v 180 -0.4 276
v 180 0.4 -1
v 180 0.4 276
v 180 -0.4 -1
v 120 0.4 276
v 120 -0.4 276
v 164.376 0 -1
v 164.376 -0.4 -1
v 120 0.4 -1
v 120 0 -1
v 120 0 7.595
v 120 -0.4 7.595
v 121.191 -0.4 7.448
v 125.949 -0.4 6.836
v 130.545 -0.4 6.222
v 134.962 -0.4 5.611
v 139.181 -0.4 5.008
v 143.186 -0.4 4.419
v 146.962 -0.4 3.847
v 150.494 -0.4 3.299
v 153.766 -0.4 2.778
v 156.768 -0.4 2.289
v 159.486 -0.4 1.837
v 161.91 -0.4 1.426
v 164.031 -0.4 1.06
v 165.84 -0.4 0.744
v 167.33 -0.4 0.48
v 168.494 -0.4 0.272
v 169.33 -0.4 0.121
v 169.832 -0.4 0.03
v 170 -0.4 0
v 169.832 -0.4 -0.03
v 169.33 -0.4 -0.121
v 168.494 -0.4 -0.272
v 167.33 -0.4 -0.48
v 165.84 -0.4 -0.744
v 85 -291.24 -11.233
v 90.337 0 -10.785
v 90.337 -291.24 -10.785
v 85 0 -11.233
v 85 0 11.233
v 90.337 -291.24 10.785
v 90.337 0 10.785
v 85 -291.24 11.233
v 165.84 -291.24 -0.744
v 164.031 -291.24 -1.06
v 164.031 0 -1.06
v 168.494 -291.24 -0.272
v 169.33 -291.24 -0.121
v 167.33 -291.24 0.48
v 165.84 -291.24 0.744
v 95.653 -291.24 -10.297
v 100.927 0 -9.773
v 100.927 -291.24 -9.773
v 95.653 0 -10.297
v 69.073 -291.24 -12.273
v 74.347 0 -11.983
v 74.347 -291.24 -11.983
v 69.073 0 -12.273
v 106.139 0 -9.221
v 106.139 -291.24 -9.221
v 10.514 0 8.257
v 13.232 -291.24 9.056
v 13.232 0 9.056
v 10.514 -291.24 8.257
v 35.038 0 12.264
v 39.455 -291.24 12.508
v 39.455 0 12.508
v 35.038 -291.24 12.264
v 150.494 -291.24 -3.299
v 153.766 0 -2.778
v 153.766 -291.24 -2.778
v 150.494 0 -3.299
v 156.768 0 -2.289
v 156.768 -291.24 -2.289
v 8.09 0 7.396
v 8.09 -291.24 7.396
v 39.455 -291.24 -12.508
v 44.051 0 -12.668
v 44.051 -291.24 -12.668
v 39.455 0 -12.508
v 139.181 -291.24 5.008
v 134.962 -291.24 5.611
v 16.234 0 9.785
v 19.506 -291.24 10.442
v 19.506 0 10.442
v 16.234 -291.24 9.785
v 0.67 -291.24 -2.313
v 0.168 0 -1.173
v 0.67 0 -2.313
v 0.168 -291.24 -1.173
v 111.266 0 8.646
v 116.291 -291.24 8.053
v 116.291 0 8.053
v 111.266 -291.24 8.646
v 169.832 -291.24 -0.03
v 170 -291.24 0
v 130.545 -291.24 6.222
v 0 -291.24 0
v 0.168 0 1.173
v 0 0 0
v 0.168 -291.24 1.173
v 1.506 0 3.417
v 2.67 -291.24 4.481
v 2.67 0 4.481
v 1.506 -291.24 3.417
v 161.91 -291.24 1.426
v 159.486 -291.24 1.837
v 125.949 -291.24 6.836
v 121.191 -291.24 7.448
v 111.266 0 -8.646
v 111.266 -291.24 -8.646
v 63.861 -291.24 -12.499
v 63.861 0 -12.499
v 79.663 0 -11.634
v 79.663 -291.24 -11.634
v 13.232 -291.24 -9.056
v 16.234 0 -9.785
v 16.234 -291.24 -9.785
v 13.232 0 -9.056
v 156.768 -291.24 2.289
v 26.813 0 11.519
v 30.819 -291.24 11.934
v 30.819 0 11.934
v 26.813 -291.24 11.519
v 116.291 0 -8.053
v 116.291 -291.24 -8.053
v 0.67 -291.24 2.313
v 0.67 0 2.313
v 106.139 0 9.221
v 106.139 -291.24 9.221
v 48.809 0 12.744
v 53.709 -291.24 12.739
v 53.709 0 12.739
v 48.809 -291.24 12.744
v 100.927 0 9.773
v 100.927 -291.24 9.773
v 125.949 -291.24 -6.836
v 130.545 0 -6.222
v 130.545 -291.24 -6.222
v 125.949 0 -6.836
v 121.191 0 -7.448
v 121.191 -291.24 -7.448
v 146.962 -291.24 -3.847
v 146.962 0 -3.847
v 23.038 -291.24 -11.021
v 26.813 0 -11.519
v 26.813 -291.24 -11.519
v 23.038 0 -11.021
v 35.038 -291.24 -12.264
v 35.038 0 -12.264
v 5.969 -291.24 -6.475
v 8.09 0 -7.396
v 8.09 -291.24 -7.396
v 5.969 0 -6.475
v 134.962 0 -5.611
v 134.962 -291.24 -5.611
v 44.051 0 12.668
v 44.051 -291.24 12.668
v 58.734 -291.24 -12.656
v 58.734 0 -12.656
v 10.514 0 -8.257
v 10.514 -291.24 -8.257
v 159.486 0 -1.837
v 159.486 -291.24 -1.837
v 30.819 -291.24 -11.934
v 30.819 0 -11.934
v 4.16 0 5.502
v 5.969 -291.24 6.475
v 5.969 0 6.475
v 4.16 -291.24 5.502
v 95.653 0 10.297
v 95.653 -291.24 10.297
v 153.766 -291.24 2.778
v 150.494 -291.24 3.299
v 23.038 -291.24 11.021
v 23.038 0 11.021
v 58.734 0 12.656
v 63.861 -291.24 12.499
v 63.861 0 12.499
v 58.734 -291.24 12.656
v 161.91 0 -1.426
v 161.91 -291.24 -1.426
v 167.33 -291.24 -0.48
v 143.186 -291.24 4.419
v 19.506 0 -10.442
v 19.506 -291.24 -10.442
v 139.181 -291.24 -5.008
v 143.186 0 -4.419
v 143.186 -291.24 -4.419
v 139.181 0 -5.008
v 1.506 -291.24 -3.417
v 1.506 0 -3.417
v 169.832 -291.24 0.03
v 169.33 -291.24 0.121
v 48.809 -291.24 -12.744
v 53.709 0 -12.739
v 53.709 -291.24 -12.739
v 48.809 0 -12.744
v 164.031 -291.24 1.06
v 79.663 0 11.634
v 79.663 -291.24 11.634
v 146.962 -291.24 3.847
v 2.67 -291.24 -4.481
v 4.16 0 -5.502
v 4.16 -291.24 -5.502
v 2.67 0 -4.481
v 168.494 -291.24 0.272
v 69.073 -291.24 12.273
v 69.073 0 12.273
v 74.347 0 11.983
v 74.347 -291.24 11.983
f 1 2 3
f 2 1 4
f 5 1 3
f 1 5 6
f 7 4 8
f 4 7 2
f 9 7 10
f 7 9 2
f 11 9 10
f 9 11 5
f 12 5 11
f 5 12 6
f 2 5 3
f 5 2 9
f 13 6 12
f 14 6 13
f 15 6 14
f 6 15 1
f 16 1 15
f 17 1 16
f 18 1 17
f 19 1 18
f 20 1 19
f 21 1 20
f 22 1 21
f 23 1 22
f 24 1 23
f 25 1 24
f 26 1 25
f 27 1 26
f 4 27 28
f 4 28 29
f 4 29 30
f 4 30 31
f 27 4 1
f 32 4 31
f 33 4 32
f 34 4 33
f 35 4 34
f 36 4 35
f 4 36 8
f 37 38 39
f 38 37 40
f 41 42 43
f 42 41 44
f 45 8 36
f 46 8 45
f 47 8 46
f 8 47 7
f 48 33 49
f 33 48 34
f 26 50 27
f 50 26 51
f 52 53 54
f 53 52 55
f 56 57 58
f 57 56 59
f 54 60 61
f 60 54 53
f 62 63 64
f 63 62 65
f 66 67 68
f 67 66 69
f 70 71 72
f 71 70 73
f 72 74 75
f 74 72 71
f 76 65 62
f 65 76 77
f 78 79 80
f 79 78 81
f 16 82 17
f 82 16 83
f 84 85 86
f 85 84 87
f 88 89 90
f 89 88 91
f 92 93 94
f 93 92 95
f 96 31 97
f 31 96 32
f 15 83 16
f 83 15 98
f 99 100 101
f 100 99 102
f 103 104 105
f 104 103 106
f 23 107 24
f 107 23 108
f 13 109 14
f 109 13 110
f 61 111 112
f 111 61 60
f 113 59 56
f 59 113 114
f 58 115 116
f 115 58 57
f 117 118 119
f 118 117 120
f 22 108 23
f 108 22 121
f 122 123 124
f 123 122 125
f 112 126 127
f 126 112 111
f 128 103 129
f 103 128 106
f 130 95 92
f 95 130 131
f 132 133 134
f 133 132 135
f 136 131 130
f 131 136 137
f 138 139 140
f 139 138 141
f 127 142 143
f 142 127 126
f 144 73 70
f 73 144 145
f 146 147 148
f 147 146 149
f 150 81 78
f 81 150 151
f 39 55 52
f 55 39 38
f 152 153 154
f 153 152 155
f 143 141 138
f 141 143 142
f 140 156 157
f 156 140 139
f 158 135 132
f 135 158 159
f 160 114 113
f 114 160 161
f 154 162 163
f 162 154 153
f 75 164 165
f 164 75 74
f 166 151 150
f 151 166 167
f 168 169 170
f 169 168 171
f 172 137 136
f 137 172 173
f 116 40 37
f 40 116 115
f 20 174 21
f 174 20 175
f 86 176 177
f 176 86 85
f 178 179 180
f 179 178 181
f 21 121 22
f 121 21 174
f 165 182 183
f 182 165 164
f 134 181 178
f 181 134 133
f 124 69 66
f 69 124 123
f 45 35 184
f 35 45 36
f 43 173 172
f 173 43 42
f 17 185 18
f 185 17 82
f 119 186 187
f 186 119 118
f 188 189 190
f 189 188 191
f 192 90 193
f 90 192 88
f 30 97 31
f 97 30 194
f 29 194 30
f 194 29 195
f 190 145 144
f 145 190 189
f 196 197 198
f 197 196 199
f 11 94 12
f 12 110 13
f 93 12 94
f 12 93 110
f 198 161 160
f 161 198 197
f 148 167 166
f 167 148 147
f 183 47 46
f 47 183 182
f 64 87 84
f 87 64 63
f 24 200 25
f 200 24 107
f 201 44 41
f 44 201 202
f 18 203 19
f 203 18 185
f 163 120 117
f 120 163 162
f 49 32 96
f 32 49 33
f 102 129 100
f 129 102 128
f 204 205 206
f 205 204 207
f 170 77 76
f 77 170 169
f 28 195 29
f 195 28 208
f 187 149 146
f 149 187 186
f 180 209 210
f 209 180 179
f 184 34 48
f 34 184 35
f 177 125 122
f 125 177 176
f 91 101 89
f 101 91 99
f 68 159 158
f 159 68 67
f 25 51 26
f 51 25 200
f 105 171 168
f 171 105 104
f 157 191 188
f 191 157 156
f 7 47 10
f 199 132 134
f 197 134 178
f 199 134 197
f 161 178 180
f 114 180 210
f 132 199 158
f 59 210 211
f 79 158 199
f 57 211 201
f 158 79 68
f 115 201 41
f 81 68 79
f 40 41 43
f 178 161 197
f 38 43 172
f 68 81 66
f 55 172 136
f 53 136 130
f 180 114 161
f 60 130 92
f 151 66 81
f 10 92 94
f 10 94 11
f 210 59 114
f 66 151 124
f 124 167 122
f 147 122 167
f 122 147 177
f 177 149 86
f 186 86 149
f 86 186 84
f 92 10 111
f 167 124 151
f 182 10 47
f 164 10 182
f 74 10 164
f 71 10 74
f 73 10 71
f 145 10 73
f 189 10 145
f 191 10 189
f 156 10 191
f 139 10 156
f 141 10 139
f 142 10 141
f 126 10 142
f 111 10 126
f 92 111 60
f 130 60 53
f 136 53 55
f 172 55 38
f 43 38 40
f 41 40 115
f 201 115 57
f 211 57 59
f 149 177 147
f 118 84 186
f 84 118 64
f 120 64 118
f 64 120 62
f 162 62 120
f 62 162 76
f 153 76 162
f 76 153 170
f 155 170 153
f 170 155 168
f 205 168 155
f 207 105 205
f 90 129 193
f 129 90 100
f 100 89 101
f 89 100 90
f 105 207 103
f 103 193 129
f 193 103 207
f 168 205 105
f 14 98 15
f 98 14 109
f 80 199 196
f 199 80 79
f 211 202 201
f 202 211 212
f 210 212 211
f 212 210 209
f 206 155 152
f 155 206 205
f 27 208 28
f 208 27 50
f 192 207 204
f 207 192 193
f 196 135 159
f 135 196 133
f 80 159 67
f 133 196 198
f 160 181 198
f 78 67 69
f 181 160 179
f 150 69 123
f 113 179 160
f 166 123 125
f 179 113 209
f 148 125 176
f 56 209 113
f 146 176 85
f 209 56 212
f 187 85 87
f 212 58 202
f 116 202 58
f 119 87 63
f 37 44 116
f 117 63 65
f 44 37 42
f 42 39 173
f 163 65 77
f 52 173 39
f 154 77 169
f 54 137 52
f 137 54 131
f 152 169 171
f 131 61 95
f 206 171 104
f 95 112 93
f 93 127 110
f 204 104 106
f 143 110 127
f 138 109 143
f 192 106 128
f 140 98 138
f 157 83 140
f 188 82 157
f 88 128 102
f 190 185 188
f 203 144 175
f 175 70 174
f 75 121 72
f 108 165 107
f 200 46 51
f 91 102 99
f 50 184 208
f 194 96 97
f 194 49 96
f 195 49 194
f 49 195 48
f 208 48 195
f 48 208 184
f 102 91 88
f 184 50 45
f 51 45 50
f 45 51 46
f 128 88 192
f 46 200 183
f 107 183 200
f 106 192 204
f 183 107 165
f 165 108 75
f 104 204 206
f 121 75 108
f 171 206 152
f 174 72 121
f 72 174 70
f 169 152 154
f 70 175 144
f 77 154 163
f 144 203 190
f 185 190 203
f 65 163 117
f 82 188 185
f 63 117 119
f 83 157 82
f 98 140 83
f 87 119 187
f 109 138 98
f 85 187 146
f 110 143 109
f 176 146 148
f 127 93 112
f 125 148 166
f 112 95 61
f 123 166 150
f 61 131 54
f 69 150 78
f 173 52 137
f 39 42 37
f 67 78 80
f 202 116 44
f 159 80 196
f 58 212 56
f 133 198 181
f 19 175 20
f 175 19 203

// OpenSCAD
// file: ../666_1032.scad
draft = true;   // sets rendering quality to draft.
$fs = draft ? 5 : 0.5;
$fa = 10;

module 666_1032(draft){

    airfoil_thickness = 0030;
    depth = main_tube_outer_diameter*2;
    width = main_tube_outer_diameter + 2*(main_tube_outer_diameter/10);
    height = depth;

    beta = 90 - trailing_edge_angle(naca = airfoil_thickness); // calculate the angle of trailing edge
    trailing_wall= 1/(cos(beta)); //calculate lenght of wall cut relative to wall thickness
    echo(trailing_wall); // print a relative thickness of material at traling edge to wall thickness. 

    difference (){
union(){

    difference(){
    	airfoil(naca = airfoil_thickness, L = 170, N=101, h = height_of_vertical_tube + main_tube_outer_diameter/2 + 2*global_clearance + coupling_wall_thickness, open = false);
    	translate ([hull_wall_thickness,0,45])
            resize([170 - hull_wall_thickness - trailing_wall*hull_wall_thickness,(170*airfoil_thickness/100)- 2*hull_wall_thickness,210], auto=true) 
                airfoil(naca = airfoil_thickness, L = 170, N=101, h = height_of_vertical_tube + main_tube_outer_diameter/2 + 2*global_clearance, open = false);
    }
    //lem spodní a horní díl
    intersection(){
        difference(){
            union(){
                translate([0,-75,cover_pilon_division[1] - hull_wall_thickness])
                        cube([190,150,hull_wall_thickness]);
                translate([0,-75,cover_pilon_division[1]])
                        cube([190,150,hull_wall_thickness]);
        }

        translate ([ribbon_width,0,45])
            resize([170 - ribbon_width - trailing_wall*ribbon_width,(170*airfoil_thickness/100)- 2*ribbon_width,210], auto=true) 
                airfoil(naca = airfoil_thickness, L = 170, N=101, h = height_of_vertical_tube + main_tube_outer_diameter/2 + 2*global_clearance, open = false);
    //difference
    }
        airfoil(naca = airfoil_thickness, L = 170, N=101, h = height_of_vertical_tube + main_tube_outer_diameter/2 + 2*global_clearance + coupling_wall_thickness, open = false);
}
}
    	//pro otevření
    	translate ([120,- hull_wall_thickness/2,- 2*global_clearance])
    	   cube ([60,hull_wall_thickness,height_of_vertical_tube + 4*global_clearance]);

    	translate ([main_tube_outer_diameter + coupling_wall_thickness*2,-depth/2 - global_clearance,height_of_vertical_tube - main_tube_outer_diameter*2 - global_clearance/2 + main_tube_outer_diameter/2 + coupling_wall_thickness])
    	   cube ([width*5,depth + 2*global_clearance,height+global_clearance + main_tube_outer_diameter]);

        // hull shell from 666_1025.scad
        translate ([- cover_pilon_position,0,0])
            rotate ([90,0,0])
                drop(draft);
    //final difference
    }
//final module
}


//pro tisk

module 666_1032_A(draft){
        intersection(){
                666_1032(draft);
            translate([0,- 75,0])
                cube([180,150,cover_pilon_division[1]]);
        }
}

module 666_1032_B(draft){
    translate([0,0,20])
        intersection(){
                666_1032(draft);
            translate([0,- 75,cover_pilon_division[1]])
                cube([180,150,cover_pilon_division[2] - cover_pilon_division[1]]);
        }
}

//666_1032(draft);
666_1032_A(draft);
666_1032_B(draft);

use <./lib/naca4.scad>
include <../Parameters.scad>
use <666_1025.scad>
use <888_1000.scad>
// file: ../888_1000.scad
/*
// Nastavení zobrazení
$vpr = [338, 0, 357];
$vpt = [180, 25, -18];
$vpd = 1280;
*/
//improving rendering speed.
draft = true;   // sets rendering quality to draft.
$fs = draft ? 5 : 0.5;
$fa = 10;

/*
TODO: 

Přední díl obsahuje převis ve směru vybrání pro držák motoru. (U horního zámku)
Otvory pro šrouby v předním dílu jsou oválné, protože nejsou kolmo k rovině modelu.


*/




//vnitřní kapka
module hollowing_skeleton(shell_thickness = hull_wall_thickness, draft)
{

    beta = 90 - trailing_edge_angle(naca = hull_airfoil_thickness); // calculate the angle of trailing edge
    trailing_wall= 1/(cos(beta)); //calculate lenght of wall cut relative to wall thickness 

    intersection () {
    resize([hull_drop_length - shell_thickness - trailing_wall* shell_thickness, (hull_drop_length*hull_airfoil_thickness/100) - 2*shell_thickness, (hull_drop_length*hull_airfoil_thickness/100) - 2*shell_thickness], auto=true)
            rotate ([0,90,0])           
            rotate_extrude($fn = draft ? 50 : 100)
                rotate([0,0,90])
                    difference()
                    {
                      polygon(points = airfoil_data(naca=hull_airfoil_thickness, L = hull_drop_length, N=draft ? 50 : 200)); 
                      square(hull_drop_length); 
                    }
                    
      translate([0,0,hull_corner_radius])
        minkowski(){                   
            translate ([0,- hull_y_size , - hull_z_size/2 + shell_thickness])
                cube ([hull_x_size,2*hull_y_size - shell_thickness, hull_z_size - 2*shell_thickness - 2*hull_corner_radius]);
                rotate ([0,90,0])
                    cylinder (h = 1, r = hull_corner_radius, $fn = draft ? 50 : 100);                   
          }
                            
    }
}

module hollowing_skeleton_hem(ribbon_width, draft)
{

    beta = 90 - trailing_edge_angle(naca = hull_airfoil_thickness); // calculate the angle of trailing edge
    trailing_wall= 1/(cos(beta)); //calculate lenght of wall cut relative to wall thickness 

    intersection () {
    resize([hull_drop_length - ribbon_width - trailing_wall* ribbon_width, (hull_drop_length*hull_airfoil_thickness/100) - 2*ribbon_width, (hull_drop_length*hull_airfoil_thickness/100) - 2*ribbon_width], auto=true)
            rotate ([0,90,0])           
            rotate_extrude($fn = draft ? 50 : 100)
                rotate([0,0,90])
                    difference()
                    {
                      polygon(points = airfoil_data(naca=hull_airfoil_thickness, L = hull_drop_length, N=draft ? 50 : 200)); 
                      square(hull_drop_length); 
                    }
                    
      translate([0,0,hull_corner_radius])
        minkowski(){                   
            translate ([0,- hull_y_size, - hull_z_size/2 + ribbon_width])
                cube ([hull_x_size,2*hull_y_size - ribbon_width, hull_z_size - 2*ribbon_width - 2*hull_corner_radius]);
                rotate ([0,90,0])
                    cylinder (h = 1, r = hull_corner_radius, $fn = draft ? 50 : 100);                   
          }
                            
    }
}




//celá kapka
module drop(draft = true)
{

    beta = 90 - trailing_edge_angle(naca = hull_airfoil_thickness); // calculate the angle of trailing edge
    trailing_wall= 1/(cos(beta)); //calculate lenght of wall cut relative to wall thickness 

	intersection () {
    	rotate ([0,90,0])           
        	rotate_extrude($fn = draft ? 50 : 100)
                    rotate([0,0,90])
                        difference()
                        {
	                        polygon(points = airfoil_data(naca=hull_airfoil_thickness, L =hull_drop_length , N=draft ? 50 : 200)); 
    	                    square(hull_drop_length); 
        	            }
            		
        translate([0,0,hull_corner_radius])
          	minkowski(){                   
             	translate ([0,-hull_y_size,-hull_z_size/2])
             			cube ([hull_x_size, 2*hull_y_size,hull_z_size-2*hull_corner_radius]);
             	  	rotate ([0,90,0])
                 		cylinder (h = 1, r = hull_corner_radius, $fn = draft ? 50 : 100);                   
		    }
		    
	}
}


//základní kapka
module drop_skin(draft){

	difference(){
			drop();
		translate([hull_wall_thickness,0,0])
			hollowing_skeleton();
	}

}




drop_skin();














use <./lib/naca4.scad>
include <../Parameters.scad>
// file: ../666_1025.scad
use <./lib/naca4.scad>
include <../Parameters.scad>
use <666_1032.scad>


//Jen pro názornost
	//translate([180,0,0])
		//rotate ([-90,0,0])
			//666_1032();





module 666_1025(){

    beta = 90 - trailing_edge_angle(naca = hull_airfoil_thickness); // calculate the angle of trailing edge
    trailing_wall= 1/(cos(beta)); //calculate lenght of wall cut relative to wall thickness
    echo(trailing_wall); // print a relative thickness of material at traling edge to wall thickness.    

    difference(){
        intersection () {
            union(){
        		rotate ([0,90,0])           
                    rotate_extrude($fn = 100)
                        rotate([0,0,90])
                            difference()
                            {

                              polygon(points = airfoil_data(naca=hull_airfoil_thickness, L =hull_drop_length , N=100)); 
                              square(hull_drop_length); 
                            }

                // 666_1032 part holder
                translate([180,0,0]) 
                    rotate ([-90,0,0]) 
                        difference(){
                            
                            translate ([hull_wall_thickness,0,0])
                                resize([170 - hull_wall_thickness - trailing_wall*hull_wall_thickness,(170*0030/100)- 2*hull_wall_thickness,210], auto=true) 
                                    airfoil(naca = 0030, L = 170, N=101, h = 200, open = false);
                            translate ([2*hull_wall_thickness,0,0])       
                                resize([170 - hull_wall_thickness*2 - trailing_wall*hull_wall_thickness*2,(160*0030/100)- 2*hull_wall_thickness,210], auto=true) 
                                    airfoil(naca = 0030, L = 170, N=101, h = 200, open = false);
                            
                        }

            }
            minkowski(){                   
             	translate ([0,-(main_tube_outer_diameter/2)+1,-hull_z_size/2])
             		cube ([hull_x_size, hull_y_size,hull_z_size]);
             	
             		rotate ([0,90,0])
                 		cylinder (h = 1, r = hull_corner_radius, $fn = 100);                   

        	}

        }   

        //hollowing skeleton
    		translate ([hull_wall_thickness,0,0])
            	intersection () {
                    resize([hull_drop_length - hull_wall_thickness - trailing_wall* hull_wall_thickness, (hull_drop_length*hull_airfoil_thickness/100) - 2*hull_wall_thickness, (hull_drop_length*hull_airfoil_thickness/100) - 2*hull_wall_thickness], auto=true)
                 		rotate ([0,90,0])           
                            rotate_extrude($fn = 100)
                                rotate([0,0,90])
                                    difference()
                                    {

                                      polygon(points = airfoil_data(naca=hull_airfoil_thickness, L = hull_drop_length, N=200)); 
                                      square(hull_drop_length); 
                                    }
                 	minkowski(){                   
                     	translate ([0,-(main_tube_outer_diameter/2),-hull_z_size/2 + hull_wall_thickness])
                     		cube ([hull_x_size,hull_y_size - hull_wall_thickness, hull_z_size - 2*hull_wall_thickness]);
                     		rotate ([0,90,0])
                         		cylinder (h = 1, r = hull_corner_radius, $fn = 100);                   
            		}                   
            	}
            //for front part
    		translate ([-2,-1 - main_tube_outer_diameter/2,-25])
    				cube ([52,hull_y_size+10,50]);

        //for tube in back
    		translate ([hull_x_size-70,0,0])
    			rotate ([0,90,0])
    				cylinder (h = 80, r1 = main_tube_outer_diameter/2, r2 = main_tube_outer_diameter/2, $fn = 200);
    					    
        //for tube - propeller

			translate ([180+2*hull_wall_thickness,-10,0])       
				rotate ([-90,0,0])
                    resize([170 - hull_wall_thickness*2 - trailing_wall*hull_wall_thickness*2,(160*0030/100)- 2*hull_wall_thickness,210], auto=true) 
                        airfoil(naca = 0030, L = 170, N=101, h = 200, open = false);
        			
        //for printing
    		translate([0,-main_tube_outer_diameter/2-4.90,-170/2])
    			cube ([600,5,170]);

    		translate([hull_x_size-50,-main_tube_outer_diameter,-main_tube_outer_diameter/2])		
    			cube([80,main_tube_outer_diameter, main_tube_outer_diameter]);	

    }


}

    intersection(){
        666_1025();
        translate([0,-20,-150])                        
           cube([150,150,300]);
    }

    translate([20,0,0])
        intersection(){
            666_1025();
            translate([150,-20,-150])
               cube([150,150,300]);
        }

    translate([40,0,0])
        intersection(){
            666_1025();
            translate([300,-20,-150])
               cube([150,150,300]);
        }


    translate([60,0,0])
        intersection(){
            666_1025();
            translate([450,-20,-150])
               cube([150,150,300]);
        }
// file: ../lib/naca4.scad
// Naca4.scad - library for parametric airfoils of 4 digit NACA series
// Code: Rudolf Huttary, Berlin 
// June 2015
// commercial use prohibited


// general use: for more examples refer to sampler.scad
// naca = naca digits or 3el vector  (default = 12 or [0, 0, .12])
// L    = chord length [mm]      (default= 100)
// N    = # sample points        (default= 81)
// h    = height [mm]            (default= 1)
// open = close at the thin end? (default = true)
// two equivalent example calls
 airfoil(naca = 2408, L = 60, N=1001, h = 30, open = false); 
// airfoil(naca = [.2, .4, .32], L = 60, N=1001, h = 30, open = false); 

module help()
{
  echo(str("\n\nList of signatures in lib:\n=================\n", 
  "module airfoil(naca=2412, L = 100, N = 81, h = 1, open = false) - renders airfoil object\n", 
  "module airfoil(naca=[.2, .4, .12], L = 100, N = 81, h = 1, open = false) - renders airfoil object using percentage for camber,  camber distance and thicknes\n", 
  "function airfoil_data(naca=12, L = 100, N = 81, open = false)\n",
  "=================\n")); 
}

help(); 
// this is the object
module airfoil(naca=12, L = 100, N = 81, h = 1, open = false)
{
  linear_extrude(height = h)
  polygon(points = airfoil_data(naca, L, N, open)); 
}

module hollow_airfoil(lnaca=12, L = 100, N = 81, h = 1, open = false, wall_thickness = 1)
{
    if (open){
        linear_extrude(height = h)

        if (wall_thickness>0){
            difference(){
                polygon(points = airfoil_data(naca, L, N, false));
                offset(delta = - wall_thickness, chamfer = false) polygon(points = airfoil_data(naca, L, N, open = false));
            }
        }
        else{
            difference(){
                offset(delta = - wall_thickness, chamfer = false) polygon(points = airfoil_data(naca, L, N, open = false));
                polygon(points = airfoil_data(naca, L, N, false));
            }
        }
    }
    else{

        linear_extrude(height = abs(wall_thickness))
            polygon(points = airfoil_data(naca, L, N, false)); 

        linear_extrude(height = h)
            difference(){
                polygon(points = airfoil_data(naca, L, N, open));
                offset(delta = - wall_thickness) polygon(points = airfoil_data(naca, L, N, open = false));
            }

        translate([0,0, h - wall_thickness])
            linear_extrude(height = abs(wall_thickness))
                polygon(points = airfoil_data(naca, L, N, false)); 

    }
}


// this is the main function providing the airfoil data
function airfoil_data(naca=12, L = 100, N = 81, open = false) = 
  let(Na = len(naca)!=3?NACA(naca):naca)
  let(A = [.2969, -0.126, -.3516, .2843, open?-0.1015:-0.1036])
  [for (b=[-180:360/(N):179.99]) 
    let (x = (1-cos(b))/2)  
    let(yt = sign(b)*Na[2]/.2*(A*[sqrt(x), x, x*x, x*x*x, x*x*x*x])) 
    Na[0]==0?L*[x, yt]:L*camber(x, yt, Na[0], Na[1], sign(b))];  


function trailing_edge_angle(naca=12, open = false) = 
  let(Na = len(naca)!=3?NACA(naca):naca)
  let(A = [.2969, -0.126, -.3516, .2843, open?-0.1015:-0.1036])
  let (x =0.999)  // set x near to airfoil trailing edge
  let(yt = Na[2]/.2*(A*[sqrt(x), x, x*x, x*x*x, x*x*x*x])) // calculate distance from x-axis at previously set position
  atan2(yt,1-x);  // calculate angle of triangle between end of airfoil. The triange height corresponds to previously calculated distance from x-axis

function surface_angle(x = 0.5, naca=12, open = false) = 
  let(Na = len(naca)!=3?NACA(naca):naca)
  let(A = [0.2969, -0.126, -0.3516, 0.2843, open?-0.1015:-0.1036])
  let(dy = Na[2]/0.2*(A*[(1/2)*(1/sqrt(x)), 1, 2*x, 3*x*x, 4*x*x*x])) // calculate derivative of airfoil function at the x point
  atan(dy);  // calculate  the angle from function derivative

function surface_distance(x = 0.5, naca=12, open = false) = 
  let(Na = len(naca)!=3?NACA(naca):naca)
  let(A = [0.2969, -0.126, -0.3516, 0.2843, open?-0.1015:-0.1036])
  Na[2]/.2*(A*[sqrt(x), x, x*x, x*x*x, x*x*x*x]); // calculate distance from x-axis at previously set position

// helper functions
function NACA(naca) = 
  let (M = floor(naca/1000))
  let (P = floor((naca-M*1000)/100)) 
  [M/100, P/10, floor(naca-M*1000-P*100)/100];  

function camber(x, y, M, P, upper) = 
  let(yc = (x<P)?M/P/P*(2*P*x-x*x): M/(1-P)/(1-P)*(1 - 2*P + 2*P*x -x*x))
  let(dy = (x<P)?2*M/P/P*(P-x):2*M/(1-P)/(1-P)*(P-x))
  let(th = atan(dy))
  [upper ? x - y*sin(th):x + y*sin(th), upper ? yc + y*cos(th):yc - y*cos(th)];
// file: ../333_1037.scad
draft = true;   // sets rendering quality to draft.
$fs = draft ? 5 : 0.5;
$fa = 10;

module 333_1037(draft){

    airfoil_thickness = 0015;
    airfoil_depth = main_tube_outer_diameter*2;
    lenght = 970;


    difference (){
        %cube ([970,70,3.86*2], center = true);

    	translate ([120,- hull_wall_thickness/2,- 2*global_clearance])
            cube ([60,hull_wall_thickness,height_of_vertical_tube + 4*global_clearance]);
    }

    //translate ([120,- hull_wall_thickness/2,- 2*global_clearance])
    rotate([90,0,0])
        airfoil(naca = airfoil_thickness, L = 170, N = draft ? 50 : 100, h = height_of_vertical_tube + main_tube_outer_diameter/2 + 2*global_clearance + thickness_between_tubes, open = false);

}



333_1037(draft);

use <./lib/naca4.scad>
include <../Parameters.scad>
use <666_1025.scad>
use <888_1000.scad>
// file: ../../Parameters.scad
//Main tube diameter - hole [mm]
main_tube_outer_diameter = 25.4;
main_tube_inner_diameter = 23.5;

//Tube for undercarriage - hole [mm]
tube_for_undercarriage_outer_diameter = 10.6;
tube_for_undercarriage_inner_diameter = 6;
global_clearance = 0.5;


//umístění podvozkových trubek

second_undercarriage_hole = main_tube_outer_diameter*2 + main_tube_outer_diameter/5 + main_tube_outer_diameter/2 + 170 + 160;

// Parameters of cube couplings
coupling_wall_thickness = main_tube_outer_diameter/5;  //width of coupling walls 
thickness_between_tubes = main_tube_outer_diameter/10;    // minimum distance between tubes in couplings

coupling_wall_thickness_undercarriage = tube_for_undercarriage_outer_diameter/3;
thickness_between_tubes_undercarriage = tube_for_undercarriage_outer_diameter/10;

//Screw diameter and nut for M4 [mm]
M4_screw_diameter=4.5;
Nut_height_M4 = 3.2;
Nut_diameter_M4 = 7.86;


//Screw diameter and nut for M3 [mm]
M3_screw_diameter = 3.2;
Nut_height_M3 = 1.7;	
Nut_diameter_M3 = 6.6; 


//The tube for help
Help_main_tube_outer = 25;
Help_main_tube_inner = 23; 
Help_tube_for_undercarriage_outer = 10;
Help_tube_for_undercarriage_inner = 5;


//main hull parameters

hull_drop_length = 580;
hull_wall_thickness = 0.8;
hull_y_size = 120;
hull_z_size = 150;
hull_x_size = 580;
hull_corner_radius = 4;
hull_airfoil_thickness= 35;  // thickness of drop generating airfoil in percent of lenght.
hull_scale_x = 1;
hull_scale_y = 1.5;
hull_scale_z = 1.5;

main_pilon_position = 170+68;
cover_pilon_position = 180;
height_of_vertical_tube = 275; //278mm je změřená délka trubky. 

ribbon_width = 5; // šířka vyztužovacích lemů. 

// šířka otvoru v přední části kapoty pro držák motoru.
width_of_engine_holder = 63;

//Top Cover Division - dělení horního krytu pro tisk
top_cover_division = [0, 50, 150, 280, 410, hull_x_size]; // upraveny seznam tak, aby deleni začinalo od nuly, což umožňí úplně automatické rozdělení.

//Bottom Cover Division - dělení dolního krytu pro tisk
bottom_cover_division = [0,100,250,365, 470, hull_x_size];
// zkrácená část pro payload pro testovací tisk
//bottom_cover_division = [0,200,250,365, 470, hull_x_size];

//Base Divison - dělení podložky
base_division = [0,140,280,410, hull_x_size];

//Cover pilon division - na výšku (v ose Z)
cover_pilon_division = [0,170,height_of_vertical_tube + main_tube_outer_diameter + coupling_wall_thickness];

//pozice šroubů
	//horní kryt
top_screw_position = [0, (top_cover_division[0] + top_cover_division[1])/4, (top_cover_division[2] - top_cover_division[1])/2 + top_cover_division[1], (top_cover_division[3] - top_cover_division[2])/2 + top_cover_division[2],(top_cover_division[4] - top_cover_division[3])/2 + top_cover_division[3],(top_cover_division[5] - top_cover_division[4])/2 + top_cover_division[4] - 20];
	//spodní kryt
bottom_screw_position = [0,(bottom_cover_division[0] + bottom_cover_division[1])/15 + 5, bottom_cover_division[1]/1.1, + bottom_cover_division[3], bottom_cover_division[3] + bottom_cover_division[1]/2, bottom_cover_division[4] - 6*global_clearance, bottom_cover_division[4] + bottom_cover_division[1]/2.5];




//šířka zámků
lock_width = 10;

//délka zámků
lock_length = 3;


//accumulator
//základní rozměry akumulátoru
width_of_accumulator = 129.4;//45+1;
depth_of_accumulator = 40.61;
height_of_accumulator = 43.65;
//Zapuštění akumulátoru
sink_of_accumulator = 5; //main_tube_outer_diameter/5 - Nut_height_M3*1.5;

//tloušťka hrany spojky
accumulator_holder_width = 18; 
accumulator_holder_thickness = 10; 

//posunutí akumálátoru na podložce
move_of_accumulator = 165;   // pozice akumulátoru (ovlivňuje těžiště)


////////////////
// Senzory
///////////////////

//opticalFlow
    width_optical_flow_senzor = 45.5;
    depth_optical_flow_senzor = 6;
    height_optical_flow_senzor = 35;
    sink_of_optical_flow_senzor = depth_optical_flow_senzor - 5; 
    M3_optical_flow_senzor_Z = 30.4;
    M3_optical_flow_senzor_X = 24;
    M3_optical_flow_senzor_Z_alone = 9.1;
    M3_optical_flow_senzor_X_alone = 16.7;
// main file
include <../../Parameters.scad>
use <../333_1037.scad>

$vpd = 680;
        
333_1037(twosided = true, draft = false);
